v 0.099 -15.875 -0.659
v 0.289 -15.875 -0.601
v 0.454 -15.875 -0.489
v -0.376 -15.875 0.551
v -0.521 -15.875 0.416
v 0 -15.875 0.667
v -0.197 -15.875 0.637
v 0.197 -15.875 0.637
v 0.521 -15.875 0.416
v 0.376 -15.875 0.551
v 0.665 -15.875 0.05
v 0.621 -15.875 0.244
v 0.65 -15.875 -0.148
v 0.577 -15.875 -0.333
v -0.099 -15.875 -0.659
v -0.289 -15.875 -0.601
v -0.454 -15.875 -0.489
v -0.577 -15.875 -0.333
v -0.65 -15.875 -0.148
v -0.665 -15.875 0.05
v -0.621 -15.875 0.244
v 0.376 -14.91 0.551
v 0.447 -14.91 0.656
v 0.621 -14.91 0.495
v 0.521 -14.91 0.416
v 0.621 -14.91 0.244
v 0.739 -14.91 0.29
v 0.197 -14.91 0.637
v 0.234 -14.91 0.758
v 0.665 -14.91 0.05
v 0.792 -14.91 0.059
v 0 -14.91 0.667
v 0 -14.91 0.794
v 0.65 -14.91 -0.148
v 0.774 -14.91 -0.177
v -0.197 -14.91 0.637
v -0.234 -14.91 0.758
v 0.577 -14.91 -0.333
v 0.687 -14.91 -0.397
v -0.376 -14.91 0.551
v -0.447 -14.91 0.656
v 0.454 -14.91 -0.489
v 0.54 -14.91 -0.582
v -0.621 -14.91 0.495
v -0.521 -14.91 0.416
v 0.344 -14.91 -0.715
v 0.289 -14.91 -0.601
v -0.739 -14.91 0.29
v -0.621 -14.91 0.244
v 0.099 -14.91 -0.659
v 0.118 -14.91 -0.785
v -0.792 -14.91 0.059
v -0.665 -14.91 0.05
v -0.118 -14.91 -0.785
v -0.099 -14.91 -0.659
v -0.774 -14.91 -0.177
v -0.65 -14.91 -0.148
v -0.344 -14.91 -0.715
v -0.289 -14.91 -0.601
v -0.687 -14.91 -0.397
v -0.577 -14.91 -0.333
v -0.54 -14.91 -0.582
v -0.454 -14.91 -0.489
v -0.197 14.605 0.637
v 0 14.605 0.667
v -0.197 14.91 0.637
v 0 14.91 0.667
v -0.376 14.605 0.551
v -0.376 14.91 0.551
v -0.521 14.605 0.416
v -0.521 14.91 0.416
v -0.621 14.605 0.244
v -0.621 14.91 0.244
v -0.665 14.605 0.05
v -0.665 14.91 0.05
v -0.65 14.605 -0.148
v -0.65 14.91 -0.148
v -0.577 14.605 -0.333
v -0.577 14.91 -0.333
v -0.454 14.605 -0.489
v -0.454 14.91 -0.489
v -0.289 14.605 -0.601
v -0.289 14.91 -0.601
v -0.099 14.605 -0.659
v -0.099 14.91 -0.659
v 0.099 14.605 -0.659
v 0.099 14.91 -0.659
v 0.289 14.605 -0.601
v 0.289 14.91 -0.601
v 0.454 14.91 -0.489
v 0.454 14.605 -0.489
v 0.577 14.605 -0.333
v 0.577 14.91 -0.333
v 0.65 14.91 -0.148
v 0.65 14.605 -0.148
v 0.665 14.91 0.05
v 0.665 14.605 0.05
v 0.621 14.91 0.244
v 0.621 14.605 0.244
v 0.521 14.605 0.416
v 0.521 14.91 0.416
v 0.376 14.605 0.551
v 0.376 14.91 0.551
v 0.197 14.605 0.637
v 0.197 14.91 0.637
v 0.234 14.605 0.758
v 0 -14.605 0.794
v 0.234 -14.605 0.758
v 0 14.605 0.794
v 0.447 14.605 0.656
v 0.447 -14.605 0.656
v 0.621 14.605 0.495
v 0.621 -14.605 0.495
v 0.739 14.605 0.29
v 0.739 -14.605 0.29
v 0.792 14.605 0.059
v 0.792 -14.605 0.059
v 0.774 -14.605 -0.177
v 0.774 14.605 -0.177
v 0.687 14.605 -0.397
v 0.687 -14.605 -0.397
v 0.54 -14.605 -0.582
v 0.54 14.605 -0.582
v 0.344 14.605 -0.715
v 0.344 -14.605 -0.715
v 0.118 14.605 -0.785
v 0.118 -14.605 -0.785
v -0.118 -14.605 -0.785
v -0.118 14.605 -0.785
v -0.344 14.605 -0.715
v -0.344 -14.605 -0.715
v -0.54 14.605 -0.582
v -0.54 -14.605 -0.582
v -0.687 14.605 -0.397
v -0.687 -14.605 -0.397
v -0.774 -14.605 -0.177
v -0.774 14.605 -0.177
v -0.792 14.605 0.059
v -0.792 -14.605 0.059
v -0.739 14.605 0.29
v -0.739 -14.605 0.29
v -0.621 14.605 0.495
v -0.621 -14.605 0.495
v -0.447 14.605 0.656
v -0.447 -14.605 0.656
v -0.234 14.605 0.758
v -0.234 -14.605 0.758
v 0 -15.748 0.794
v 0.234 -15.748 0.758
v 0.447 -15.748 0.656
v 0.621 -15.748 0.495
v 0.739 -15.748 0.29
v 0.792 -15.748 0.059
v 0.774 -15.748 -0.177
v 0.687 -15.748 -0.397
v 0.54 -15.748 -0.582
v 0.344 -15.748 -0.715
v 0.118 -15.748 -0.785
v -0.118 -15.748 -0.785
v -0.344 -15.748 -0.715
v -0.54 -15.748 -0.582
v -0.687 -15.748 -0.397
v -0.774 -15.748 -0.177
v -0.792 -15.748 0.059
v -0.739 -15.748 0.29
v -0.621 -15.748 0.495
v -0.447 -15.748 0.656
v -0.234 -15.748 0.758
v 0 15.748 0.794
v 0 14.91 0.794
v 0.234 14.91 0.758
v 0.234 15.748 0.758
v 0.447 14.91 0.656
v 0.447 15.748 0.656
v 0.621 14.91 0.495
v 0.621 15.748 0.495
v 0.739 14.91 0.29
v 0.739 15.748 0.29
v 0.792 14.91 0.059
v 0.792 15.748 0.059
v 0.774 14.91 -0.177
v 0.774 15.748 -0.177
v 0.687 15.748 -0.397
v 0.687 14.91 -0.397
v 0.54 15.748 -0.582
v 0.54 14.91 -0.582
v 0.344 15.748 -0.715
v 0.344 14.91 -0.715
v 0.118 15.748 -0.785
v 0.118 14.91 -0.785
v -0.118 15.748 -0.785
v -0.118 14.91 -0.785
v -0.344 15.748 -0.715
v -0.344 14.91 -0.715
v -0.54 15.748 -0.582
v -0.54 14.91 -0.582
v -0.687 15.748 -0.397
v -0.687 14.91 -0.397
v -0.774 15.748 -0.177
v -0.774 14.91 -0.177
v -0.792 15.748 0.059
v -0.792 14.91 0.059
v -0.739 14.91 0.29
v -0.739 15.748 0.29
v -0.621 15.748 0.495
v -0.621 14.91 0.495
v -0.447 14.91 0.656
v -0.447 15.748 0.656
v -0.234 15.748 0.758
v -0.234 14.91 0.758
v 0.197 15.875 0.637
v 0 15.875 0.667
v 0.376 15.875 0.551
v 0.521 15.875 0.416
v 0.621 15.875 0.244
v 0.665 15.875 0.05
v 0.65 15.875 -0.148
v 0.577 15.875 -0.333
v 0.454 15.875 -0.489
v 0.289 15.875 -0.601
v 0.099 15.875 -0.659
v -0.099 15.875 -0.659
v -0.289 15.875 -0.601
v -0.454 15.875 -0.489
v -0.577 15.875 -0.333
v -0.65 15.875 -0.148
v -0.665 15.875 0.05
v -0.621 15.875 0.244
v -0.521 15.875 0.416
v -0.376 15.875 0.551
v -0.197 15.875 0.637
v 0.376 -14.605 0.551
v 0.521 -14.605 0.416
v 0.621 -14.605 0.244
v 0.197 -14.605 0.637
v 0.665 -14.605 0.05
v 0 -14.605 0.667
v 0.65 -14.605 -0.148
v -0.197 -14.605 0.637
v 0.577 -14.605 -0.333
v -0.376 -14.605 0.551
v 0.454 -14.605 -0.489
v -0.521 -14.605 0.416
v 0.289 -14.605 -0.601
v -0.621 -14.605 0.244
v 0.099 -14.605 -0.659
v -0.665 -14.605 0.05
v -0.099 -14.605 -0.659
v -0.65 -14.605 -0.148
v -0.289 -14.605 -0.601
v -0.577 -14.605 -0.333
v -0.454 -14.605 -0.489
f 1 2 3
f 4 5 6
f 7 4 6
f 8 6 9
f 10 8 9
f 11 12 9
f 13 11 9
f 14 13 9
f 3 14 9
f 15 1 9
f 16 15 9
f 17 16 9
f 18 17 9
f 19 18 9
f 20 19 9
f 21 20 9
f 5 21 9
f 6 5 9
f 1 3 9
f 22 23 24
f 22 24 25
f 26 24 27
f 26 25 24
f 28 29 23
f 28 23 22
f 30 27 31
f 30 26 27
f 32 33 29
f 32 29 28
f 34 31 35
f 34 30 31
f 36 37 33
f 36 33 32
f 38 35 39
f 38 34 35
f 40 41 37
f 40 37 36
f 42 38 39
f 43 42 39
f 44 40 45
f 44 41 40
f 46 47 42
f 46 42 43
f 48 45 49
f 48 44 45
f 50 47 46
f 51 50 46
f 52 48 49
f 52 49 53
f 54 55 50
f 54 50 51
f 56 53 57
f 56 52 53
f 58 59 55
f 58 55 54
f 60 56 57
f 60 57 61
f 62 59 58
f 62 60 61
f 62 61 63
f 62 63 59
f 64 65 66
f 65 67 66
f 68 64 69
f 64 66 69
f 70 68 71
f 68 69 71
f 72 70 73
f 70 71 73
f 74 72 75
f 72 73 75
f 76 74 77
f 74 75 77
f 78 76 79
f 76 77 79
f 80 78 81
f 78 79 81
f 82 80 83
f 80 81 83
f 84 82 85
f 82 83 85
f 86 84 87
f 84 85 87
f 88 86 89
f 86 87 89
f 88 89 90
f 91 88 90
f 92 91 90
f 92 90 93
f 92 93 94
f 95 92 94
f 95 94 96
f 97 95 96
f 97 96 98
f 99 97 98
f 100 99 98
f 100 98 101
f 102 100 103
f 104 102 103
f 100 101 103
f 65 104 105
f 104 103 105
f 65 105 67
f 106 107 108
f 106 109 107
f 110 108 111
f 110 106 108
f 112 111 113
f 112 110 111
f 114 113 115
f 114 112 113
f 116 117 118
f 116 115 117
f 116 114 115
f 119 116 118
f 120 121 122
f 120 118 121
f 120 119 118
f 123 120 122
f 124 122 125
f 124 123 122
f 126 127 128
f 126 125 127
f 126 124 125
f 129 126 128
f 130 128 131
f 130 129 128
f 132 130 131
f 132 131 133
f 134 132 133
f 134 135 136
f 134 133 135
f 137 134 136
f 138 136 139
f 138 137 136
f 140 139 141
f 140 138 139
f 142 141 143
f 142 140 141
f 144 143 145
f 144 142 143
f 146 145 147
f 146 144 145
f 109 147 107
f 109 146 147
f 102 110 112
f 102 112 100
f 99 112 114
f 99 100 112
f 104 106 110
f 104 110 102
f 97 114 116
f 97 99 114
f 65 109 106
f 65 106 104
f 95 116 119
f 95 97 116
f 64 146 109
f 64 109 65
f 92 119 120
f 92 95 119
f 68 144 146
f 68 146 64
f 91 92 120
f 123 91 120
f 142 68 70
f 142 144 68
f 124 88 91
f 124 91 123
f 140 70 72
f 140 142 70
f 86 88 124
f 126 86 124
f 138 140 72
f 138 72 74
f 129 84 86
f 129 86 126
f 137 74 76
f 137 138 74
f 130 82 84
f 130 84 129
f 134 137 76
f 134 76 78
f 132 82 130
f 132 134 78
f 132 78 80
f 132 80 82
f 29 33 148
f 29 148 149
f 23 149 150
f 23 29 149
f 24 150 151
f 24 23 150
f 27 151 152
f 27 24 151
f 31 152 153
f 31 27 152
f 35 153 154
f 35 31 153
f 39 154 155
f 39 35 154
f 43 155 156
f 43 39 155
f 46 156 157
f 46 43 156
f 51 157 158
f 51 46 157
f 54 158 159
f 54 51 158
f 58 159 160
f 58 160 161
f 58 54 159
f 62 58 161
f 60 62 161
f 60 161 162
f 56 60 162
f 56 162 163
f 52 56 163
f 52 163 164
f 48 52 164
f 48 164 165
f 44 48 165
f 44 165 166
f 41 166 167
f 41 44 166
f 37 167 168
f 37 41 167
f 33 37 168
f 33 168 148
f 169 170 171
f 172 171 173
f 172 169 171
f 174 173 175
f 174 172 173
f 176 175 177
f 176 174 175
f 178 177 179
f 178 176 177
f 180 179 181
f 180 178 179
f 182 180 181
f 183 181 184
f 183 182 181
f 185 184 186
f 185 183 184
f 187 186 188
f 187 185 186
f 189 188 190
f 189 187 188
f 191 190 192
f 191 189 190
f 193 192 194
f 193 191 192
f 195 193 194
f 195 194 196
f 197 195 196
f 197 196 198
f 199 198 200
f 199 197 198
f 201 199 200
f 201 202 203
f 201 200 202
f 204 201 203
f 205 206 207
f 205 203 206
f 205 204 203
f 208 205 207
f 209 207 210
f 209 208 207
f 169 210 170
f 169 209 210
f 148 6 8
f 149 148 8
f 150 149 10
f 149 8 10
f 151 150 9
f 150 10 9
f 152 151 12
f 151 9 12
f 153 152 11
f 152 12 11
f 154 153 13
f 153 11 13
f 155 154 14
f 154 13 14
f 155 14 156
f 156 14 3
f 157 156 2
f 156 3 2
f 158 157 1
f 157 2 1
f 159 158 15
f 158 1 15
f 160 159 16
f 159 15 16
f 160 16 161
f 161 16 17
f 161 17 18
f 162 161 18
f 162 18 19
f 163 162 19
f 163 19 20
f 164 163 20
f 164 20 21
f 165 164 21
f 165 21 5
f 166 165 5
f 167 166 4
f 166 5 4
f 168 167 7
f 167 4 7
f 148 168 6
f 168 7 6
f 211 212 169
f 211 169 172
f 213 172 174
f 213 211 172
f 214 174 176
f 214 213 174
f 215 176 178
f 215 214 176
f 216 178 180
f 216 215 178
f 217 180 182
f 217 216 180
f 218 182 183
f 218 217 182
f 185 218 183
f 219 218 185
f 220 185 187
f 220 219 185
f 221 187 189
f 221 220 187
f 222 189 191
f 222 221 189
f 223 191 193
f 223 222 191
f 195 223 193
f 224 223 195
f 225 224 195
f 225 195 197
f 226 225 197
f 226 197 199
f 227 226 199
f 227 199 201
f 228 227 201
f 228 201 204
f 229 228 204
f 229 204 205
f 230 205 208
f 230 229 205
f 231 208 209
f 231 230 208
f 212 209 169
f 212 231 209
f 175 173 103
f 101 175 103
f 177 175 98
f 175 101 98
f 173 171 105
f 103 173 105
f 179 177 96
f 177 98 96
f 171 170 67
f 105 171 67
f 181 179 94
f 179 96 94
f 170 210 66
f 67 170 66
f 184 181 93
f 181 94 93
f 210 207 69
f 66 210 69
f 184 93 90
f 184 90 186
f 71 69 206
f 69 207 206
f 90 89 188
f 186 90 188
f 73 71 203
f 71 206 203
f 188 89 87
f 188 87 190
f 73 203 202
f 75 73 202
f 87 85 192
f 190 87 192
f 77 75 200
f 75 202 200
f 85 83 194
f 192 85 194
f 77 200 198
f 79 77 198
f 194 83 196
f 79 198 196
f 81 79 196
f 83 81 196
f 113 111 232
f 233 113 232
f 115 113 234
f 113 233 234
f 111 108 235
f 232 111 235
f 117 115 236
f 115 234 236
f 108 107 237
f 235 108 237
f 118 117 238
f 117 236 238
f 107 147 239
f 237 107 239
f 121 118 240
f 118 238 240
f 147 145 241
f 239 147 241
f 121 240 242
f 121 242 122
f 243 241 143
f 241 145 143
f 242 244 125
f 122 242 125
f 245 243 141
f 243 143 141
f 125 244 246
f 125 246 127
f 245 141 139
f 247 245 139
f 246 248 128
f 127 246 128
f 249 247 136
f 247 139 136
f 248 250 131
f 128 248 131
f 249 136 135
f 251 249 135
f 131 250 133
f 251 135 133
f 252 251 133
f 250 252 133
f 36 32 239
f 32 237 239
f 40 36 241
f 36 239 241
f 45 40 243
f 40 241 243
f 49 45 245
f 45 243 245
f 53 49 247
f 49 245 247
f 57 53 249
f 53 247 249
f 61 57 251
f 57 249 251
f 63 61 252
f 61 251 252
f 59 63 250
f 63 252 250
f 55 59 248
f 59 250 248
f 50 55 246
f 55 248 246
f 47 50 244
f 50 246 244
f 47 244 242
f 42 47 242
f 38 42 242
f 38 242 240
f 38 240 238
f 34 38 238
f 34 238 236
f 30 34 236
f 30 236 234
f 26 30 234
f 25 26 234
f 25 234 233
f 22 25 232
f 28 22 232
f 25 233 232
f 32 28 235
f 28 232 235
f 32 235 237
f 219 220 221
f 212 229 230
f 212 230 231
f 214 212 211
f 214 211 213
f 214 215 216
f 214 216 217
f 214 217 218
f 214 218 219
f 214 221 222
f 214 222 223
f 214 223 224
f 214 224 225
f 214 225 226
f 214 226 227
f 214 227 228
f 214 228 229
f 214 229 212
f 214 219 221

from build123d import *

# Parameters (mm, degrees)
SKETCH1_R      = 0.79375
EXTRUDE1_DEPTH = 15.875
SKETCH2_W      = 0.127
SKETCH2_H      = 0.3048
CHAMFER1_SIZE  = 0.127


with BuildPart() as part:
    # Sketch1 → Extrude1 (new, symmetric)
    with BuildSketch(Plane(origin=(0, 0, 0), x_dir=(1, 0, 0), z_dir=(0, 1, 0))):
        with Locations(Location((0, 0, 0), (0, 0, 270))):
            Circle(SKETCH1_R)
    extrude(amount=EXTRUDE1_DEPTH, both=True)

    # Sketch2 → Cut-Revolve1 (revolve, cut)
    with BuildSketch(Plane(origin=(0, 0, 0), x_dir=(0, 0, -1), z_dir=(1, 0, 0)), mode=Mode.PRIVATE) as cut_revolve1_sk:
        with Locations((0.73025, 14.7574)):
            Rectangle(SKETCH2_W, SKETCH2_H)
        with Locations((0.73025, -14.7574)):
            Rectangle(SKETCH2_W, SKETCH2_H)
    revolve(cut_revolve1_sk.sketch.rotate(Axis((0, 15.875, 0), (0, -1, 0)), 180), axis=Axis((0, 15.875, 0), (0, -1, 0)), mode=Mode.SUBTRACT)

    # Chamfer1
    chamfer1_edges = [part.edges().sort_by_distance(p)[0] for p in [
        (0, -15.875, -0.79375),
        (0, 15.875, -0.79375),
    ]]
    chamfer(chamfer1_edges, length=CHAMFER1_SIZE)


solid = part.part
